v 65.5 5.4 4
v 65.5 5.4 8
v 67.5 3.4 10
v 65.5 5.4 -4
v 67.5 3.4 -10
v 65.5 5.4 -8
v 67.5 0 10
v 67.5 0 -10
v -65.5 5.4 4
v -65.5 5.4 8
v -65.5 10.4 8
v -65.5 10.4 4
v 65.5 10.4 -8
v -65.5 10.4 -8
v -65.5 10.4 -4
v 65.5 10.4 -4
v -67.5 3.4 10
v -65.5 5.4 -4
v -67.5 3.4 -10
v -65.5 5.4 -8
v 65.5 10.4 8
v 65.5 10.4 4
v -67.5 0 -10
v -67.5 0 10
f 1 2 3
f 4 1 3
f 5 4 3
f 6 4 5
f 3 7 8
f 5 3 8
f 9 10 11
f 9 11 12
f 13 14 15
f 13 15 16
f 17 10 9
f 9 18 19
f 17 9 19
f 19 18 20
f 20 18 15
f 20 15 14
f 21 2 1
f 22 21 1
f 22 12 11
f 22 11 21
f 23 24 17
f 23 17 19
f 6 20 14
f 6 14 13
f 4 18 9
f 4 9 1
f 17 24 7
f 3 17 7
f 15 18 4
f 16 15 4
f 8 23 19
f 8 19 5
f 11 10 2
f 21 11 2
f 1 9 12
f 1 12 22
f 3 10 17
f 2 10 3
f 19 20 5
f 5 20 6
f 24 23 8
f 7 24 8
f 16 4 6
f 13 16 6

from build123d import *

# Parameters (mm, degrees)
SKETCH1_W           = 135
SKETCH1_H           = 20
BOSS_EXTRUDE1_DEPTH = 5.4
CHAMFER1_SIZE       = 2
SKETCH2_W           = 131
SKETCH2_H           = 4
BOSS_EXTRUDE2_DEPTH = 5


with BuildPart() as part:
    # Sketch1 → Boss-Extrude1 (new body)
    with BuildSketch(Plane(origin=(0, 0, 0), x_dir=(1, 0, 0), z_dir=(0, 1, 0))):
        Rectangle(SKETCH1_W, SKETCH1_H)
    extrude(amount=BOSS_EXTRUDE1_DEPTH)

    # Chamfer1
    chamfer1_edges = [part.edges().sort_by_distance(p)[0] for p in [
        (-67.5, 5.4, 0),
        (0, 5.4, 10),
        (67.5, 5.4, 0),
        (0, 5.4, -10),
    ]]
    chamfer(chamfer1_edges, length=CHAMFER1_SIZE)

    # Sketch2 → Boss-Extrude2 (add)
    with BuildSketch(Plane(origin=(0, 5.4, 0), x_dir=(1, 0, 0), z_dir=(0, 1, 0))):
        with Locations((0, 6)):
            Rectangle(SKETCH2_W, SKETCH2_H)
        with Locations((0, -6)):
            Rectangle(SKETCH2_W, SKETCH2_H)
    extrude(amount=BOSS_EXTRUDE2_DEPTH)


solid = part.part
